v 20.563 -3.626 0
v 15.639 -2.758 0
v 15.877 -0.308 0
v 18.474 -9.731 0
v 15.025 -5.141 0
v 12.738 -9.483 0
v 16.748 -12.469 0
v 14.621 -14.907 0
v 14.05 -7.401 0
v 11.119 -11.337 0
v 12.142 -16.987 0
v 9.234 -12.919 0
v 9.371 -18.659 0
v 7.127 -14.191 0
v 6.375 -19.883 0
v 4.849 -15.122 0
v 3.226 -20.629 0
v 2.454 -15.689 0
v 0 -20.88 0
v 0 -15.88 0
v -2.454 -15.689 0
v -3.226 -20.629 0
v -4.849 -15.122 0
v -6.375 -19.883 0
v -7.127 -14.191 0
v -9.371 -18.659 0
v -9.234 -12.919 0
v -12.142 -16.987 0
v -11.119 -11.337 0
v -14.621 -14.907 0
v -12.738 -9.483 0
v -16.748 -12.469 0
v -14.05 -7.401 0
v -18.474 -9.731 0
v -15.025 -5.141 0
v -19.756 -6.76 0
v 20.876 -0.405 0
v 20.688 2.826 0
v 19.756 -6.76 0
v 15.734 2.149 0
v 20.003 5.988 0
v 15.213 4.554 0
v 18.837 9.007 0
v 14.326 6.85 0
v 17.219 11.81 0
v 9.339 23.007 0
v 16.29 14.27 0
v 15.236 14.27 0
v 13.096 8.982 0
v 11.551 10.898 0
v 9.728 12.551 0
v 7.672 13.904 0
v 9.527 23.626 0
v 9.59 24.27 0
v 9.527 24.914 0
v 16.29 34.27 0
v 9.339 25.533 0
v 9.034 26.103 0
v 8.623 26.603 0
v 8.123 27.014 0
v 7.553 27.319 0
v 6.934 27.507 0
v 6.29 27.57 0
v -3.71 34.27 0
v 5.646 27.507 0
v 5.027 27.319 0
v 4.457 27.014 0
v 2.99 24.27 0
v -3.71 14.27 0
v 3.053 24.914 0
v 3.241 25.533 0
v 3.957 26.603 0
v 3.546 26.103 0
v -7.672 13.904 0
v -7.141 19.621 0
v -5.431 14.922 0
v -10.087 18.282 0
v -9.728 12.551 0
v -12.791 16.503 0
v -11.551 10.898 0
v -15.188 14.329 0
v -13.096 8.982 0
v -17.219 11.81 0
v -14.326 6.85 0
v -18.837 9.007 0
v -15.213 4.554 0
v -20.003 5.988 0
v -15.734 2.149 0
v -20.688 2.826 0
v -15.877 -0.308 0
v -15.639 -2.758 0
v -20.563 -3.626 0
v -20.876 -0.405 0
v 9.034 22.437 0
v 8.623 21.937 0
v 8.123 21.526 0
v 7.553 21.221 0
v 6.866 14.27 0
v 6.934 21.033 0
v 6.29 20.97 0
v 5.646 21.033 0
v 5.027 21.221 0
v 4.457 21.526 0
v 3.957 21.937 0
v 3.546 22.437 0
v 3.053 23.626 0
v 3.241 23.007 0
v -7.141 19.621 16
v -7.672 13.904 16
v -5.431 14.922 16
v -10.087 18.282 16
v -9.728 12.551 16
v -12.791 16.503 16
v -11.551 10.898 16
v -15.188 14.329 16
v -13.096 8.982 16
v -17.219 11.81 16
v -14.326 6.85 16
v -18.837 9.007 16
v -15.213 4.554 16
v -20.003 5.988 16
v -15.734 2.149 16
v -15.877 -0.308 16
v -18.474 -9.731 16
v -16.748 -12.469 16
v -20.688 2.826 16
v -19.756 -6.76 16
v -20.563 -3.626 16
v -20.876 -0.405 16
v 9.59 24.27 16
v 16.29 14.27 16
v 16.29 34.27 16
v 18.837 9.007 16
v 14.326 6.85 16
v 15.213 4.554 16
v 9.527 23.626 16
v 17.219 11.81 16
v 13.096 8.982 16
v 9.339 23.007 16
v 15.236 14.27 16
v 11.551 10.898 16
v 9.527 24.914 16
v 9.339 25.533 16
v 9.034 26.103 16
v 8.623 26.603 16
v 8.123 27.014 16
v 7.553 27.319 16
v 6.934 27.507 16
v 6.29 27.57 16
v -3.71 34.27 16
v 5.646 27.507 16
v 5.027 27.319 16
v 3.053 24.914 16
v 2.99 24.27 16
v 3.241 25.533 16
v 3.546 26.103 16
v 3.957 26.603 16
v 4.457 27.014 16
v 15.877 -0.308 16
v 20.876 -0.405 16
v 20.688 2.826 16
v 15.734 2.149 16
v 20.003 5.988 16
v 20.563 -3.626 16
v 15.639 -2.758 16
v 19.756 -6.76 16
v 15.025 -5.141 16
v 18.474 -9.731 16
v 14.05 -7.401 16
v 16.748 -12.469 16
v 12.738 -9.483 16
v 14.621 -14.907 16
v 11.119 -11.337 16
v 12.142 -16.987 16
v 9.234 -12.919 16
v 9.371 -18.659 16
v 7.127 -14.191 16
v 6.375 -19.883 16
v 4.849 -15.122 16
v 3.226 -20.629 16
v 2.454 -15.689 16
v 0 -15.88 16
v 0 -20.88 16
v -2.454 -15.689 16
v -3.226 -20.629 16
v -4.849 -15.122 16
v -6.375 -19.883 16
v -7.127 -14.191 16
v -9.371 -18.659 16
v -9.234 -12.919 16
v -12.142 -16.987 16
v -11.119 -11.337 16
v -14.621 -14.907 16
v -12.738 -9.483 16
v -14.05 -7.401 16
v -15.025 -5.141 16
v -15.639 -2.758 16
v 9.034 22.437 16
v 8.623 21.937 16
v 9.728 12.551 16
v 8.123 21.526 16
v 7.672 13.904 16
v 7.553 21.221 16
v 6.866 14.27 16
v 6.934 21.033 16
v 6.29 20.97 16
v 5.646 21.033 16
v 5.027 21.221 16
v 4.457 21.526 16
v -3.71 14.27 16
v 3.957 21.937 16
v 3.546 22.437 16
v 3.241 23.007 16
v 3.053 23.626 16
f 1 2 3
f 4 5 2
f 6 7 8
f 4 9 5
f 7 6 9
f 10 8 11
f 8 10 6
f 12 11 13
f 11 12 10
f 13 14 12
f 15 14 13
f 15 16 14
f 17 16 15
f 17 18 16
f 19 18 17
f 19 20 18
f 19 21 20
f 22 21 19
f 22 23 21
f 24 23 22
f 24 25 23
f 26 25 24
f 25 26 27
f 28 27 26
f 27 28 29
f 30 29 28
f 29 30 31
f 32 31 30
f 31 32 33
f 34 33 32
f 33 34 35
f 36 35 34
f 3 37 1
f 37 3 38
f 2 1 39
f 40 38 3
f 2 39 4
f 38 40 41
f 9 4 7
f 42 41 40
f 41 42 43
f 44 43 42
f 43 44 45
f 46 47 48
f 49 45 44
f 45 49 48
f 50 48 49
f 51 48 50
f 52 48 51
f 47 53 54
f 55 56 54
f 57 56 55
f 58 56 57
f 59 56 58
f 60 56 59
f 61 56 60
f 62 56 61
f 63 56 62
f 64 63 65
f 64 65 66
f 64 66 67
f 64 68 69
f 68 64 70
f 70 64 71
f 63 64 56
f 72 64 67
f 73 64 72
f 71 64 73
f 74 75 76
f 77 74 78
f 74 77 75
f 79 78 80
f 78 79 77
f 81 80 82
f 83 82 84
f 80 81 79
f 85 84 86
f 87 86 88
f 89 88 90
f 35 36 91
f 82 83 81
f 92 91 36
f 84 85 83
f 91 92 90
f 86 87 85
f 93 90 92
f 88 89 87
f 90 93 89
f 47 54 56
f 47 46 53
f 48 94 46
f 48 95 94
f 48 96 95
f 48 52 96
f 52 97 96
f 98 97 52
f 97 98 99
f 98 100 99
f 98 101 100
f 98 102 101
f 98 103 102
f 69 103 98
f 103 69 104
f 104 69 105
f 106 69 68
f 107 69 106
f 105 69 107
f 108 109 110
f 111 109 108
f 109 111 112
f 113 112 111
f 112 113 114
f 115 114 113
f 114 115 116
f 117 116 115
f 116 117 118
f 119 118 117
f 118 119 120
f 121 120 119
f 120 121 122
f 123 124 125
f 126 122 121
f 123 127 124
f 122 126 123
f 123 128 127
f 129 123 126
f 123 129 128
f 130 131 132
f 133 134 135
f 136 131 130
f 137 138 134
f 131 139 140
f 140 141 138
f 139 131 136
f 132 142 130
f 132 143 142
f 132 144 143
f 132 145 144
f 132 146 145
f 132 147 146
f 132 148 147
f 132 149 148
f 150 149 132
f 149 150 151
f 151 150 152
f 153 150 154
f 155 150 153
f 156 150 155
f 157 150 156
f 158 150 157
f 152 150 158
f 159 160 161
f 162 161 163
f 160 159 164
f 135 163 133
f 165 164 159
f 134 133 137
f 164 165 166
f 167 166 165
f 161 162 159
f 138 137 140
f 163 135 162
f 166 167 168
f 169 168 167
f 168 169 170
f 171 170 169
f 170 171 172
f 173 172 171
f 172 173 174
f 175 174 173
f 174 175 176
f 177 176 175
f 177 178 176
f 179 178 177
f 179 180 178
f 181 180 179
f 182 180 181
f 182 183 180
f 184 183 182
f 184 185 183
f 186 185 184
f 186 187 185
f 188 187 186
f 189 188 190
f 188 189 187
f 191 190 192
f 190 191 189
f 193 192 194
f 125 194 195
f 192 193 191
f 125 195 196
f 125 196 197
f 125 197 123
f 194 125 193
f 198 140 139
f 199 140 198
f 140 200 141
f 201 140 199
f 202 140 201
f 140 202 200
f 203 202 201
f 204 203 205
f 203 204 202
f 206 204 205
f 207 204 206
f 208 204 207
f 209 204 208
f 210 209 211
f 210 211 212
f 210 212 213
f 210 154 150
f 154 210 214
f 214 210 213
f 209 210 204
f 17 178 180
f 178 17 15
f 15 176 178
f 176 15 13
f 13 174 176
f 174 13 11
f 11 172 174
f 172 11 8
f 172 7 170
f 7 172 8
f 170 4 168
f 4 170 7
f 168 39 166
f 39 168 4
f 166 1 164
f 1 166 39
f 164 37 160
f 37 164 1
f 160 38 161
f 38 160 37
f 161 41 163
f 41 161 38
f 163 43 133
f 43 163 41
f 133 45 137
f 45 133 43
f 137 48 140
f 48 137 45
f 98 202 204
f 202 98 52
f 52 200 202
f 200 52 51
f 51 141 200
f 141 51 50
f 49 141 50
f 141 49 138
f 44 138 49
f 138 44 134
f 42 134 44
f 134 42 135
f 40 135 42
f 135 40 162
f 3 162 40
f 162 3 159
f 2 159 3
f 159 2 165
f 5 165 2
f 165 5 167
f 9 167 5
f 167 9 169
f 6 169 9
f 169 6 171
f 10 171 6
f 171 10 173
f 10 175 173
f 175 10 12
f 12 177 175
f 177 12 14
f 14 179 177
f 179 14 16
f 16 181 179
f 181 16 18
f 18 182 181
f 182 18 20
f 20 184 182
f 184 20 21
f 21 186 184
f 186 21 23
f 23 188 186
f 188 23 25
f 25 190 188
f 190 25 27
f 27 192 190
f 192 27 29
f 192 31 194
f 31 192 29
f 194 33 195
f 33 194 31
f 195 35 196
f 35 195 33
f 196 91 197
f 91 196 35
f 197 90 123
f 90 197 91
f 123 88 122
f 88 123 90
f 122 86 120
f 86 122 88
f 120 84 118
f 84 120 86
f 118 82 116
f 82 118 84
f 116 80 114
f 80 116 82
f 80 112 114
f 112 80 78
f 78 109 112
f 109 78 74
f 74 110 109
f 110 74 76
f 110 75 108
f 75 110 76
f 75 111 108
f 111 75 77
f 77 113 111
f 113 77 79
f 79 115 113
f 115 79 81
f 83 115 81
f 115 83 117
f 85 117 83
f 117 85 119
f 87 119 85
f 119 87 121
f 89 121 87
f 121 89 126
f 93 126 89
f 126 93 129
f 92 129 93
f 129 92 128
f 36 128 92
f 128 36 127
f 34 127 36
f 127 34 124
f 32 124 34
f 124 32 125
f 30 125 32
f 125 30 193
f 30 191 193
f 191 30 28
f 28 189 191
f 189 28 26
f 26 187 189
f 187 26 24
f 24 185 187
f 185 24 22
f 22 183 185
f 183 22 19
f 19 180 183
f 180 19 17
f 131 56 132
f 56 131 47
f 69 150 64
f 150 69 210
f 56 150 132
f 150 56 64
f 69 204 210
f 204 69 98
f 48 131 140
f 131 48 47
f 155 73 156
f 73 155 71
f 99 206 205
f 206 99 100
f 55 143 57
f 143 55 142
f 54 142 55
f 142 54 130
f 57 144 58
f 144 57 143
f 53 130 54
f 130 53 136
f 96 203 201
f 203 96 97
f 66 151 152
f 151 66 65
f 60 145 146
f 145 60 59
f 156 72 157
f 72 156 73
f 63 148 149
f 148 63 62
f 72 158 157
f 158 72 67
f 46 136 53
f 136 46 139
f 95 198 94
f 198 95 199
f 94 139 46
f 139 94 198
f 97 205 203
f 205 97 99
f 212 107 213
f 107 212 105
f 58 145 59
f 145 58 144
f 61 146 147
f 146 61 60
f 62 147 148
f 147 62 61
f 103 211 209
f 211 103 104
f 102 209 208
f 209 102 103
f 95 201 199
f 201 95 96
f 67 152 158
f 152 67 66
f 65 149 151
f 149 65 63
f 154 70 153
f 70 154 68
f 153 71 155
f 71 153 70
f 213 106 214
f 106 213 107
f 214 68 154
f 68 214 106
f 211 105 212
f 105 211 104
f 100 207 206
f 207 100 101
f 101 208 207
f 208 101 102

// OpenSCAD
$fn = 32;

// ----------------------------------------------------------------------
// Pipe clamp: 41.76 mm ring, 5 mm wall, 16 mm wide
// ----------------------------------------------------------------------

// --- parameters (mm) ---
outer_r = 20.88;          // clamp outside radius
inner_r = 15.88;          // pipe bore radius
band = 5;                 // band thickness
clamp_w = 16;             // clamp width
opening = 40;             // opening angle between the ends
lug_w = 20;               // lug width
lug_len = 20;             // lug length
bolt_d = 6.6;             // bolt hole

clamp_profile = [[-7.141, 19.621], [-10.087, 18.282], [-12.791, 16.503], [-15.188, 14.329], [-17.219, 11.81], [-18.837, 9.007], [-20.003, 5.988], [-20.688, 2.826], [-20.876, -0.405], [-20.563, -3.626], [-19.756, -6.76], [-18.474, -9.731], [-16.748, -12.469], [-14.621, -14.907], [-12.142, -16.987], [-9.371, -18.659], [-6.375, -19.883], [-3.226, -20.629], [0, -20.88], [3.226, -20.629], [6.375, -19.883], [9.371, -18.659], [12.142, -16.987], [14.621, -14.907], [16.748, -12.469], [18.474, -9.731], [19.756, -6.76], [20.563, -3.626], [20.876, -0.405], [20.688, 2.826], [20.003, 5.988], [18.837, 9.007], [17.219, 11.81], [15.188, 14.329], [12.791, 16.503], [10.087, 18.282], [7.141, 19.621], [5.431, 14.922], [7.672, 13.904], [9.728, 12.551], [11.551, 10.898], [13.096, 8.982], [14.326, 6.85], [15.213, 4.554], [15.734, 2.149], [15.877, -0.308], [15.639, -2.758], [15.025, -5.141], [14.05, -7.401], [12.738, -9.483], [11.119, -11.337], [9.234, -12.919], [7.127, -14.191], [4.849, -15.122], [2.454, -15.689], [0, -15.88], [-2.454, -15.689], [-4.849, -15.122], [-7.127, -14.191], [-9.234, -12.919], [-11.119, -11.337], [-12.738, -9.483], [-14.05, -7.401], [-15.025, -5.141], [-15.639, -2.758], [-15.877, -0.308], [-15.734, 2.149], [-15.213, 4.554], [-14.326, 6.85], [-13.096, 8.982], [-11.551, 10.898], [-9.728, 12.551], [-7.672, 13.904], [-5.431, 14.922]];

difference() {
  union() {
    linear_extrude(height = clamp_w) polygon(clamp_profile);
    /* bolt lug on the other end */
    translate([-3.71, 14.27, 0]) cube([lug_w, 20, clamp_w]);
  }
  translate([6.29, 24.27, -2.5]) cylinder(h = clamp_w + 5, d = bolt_d);
}
